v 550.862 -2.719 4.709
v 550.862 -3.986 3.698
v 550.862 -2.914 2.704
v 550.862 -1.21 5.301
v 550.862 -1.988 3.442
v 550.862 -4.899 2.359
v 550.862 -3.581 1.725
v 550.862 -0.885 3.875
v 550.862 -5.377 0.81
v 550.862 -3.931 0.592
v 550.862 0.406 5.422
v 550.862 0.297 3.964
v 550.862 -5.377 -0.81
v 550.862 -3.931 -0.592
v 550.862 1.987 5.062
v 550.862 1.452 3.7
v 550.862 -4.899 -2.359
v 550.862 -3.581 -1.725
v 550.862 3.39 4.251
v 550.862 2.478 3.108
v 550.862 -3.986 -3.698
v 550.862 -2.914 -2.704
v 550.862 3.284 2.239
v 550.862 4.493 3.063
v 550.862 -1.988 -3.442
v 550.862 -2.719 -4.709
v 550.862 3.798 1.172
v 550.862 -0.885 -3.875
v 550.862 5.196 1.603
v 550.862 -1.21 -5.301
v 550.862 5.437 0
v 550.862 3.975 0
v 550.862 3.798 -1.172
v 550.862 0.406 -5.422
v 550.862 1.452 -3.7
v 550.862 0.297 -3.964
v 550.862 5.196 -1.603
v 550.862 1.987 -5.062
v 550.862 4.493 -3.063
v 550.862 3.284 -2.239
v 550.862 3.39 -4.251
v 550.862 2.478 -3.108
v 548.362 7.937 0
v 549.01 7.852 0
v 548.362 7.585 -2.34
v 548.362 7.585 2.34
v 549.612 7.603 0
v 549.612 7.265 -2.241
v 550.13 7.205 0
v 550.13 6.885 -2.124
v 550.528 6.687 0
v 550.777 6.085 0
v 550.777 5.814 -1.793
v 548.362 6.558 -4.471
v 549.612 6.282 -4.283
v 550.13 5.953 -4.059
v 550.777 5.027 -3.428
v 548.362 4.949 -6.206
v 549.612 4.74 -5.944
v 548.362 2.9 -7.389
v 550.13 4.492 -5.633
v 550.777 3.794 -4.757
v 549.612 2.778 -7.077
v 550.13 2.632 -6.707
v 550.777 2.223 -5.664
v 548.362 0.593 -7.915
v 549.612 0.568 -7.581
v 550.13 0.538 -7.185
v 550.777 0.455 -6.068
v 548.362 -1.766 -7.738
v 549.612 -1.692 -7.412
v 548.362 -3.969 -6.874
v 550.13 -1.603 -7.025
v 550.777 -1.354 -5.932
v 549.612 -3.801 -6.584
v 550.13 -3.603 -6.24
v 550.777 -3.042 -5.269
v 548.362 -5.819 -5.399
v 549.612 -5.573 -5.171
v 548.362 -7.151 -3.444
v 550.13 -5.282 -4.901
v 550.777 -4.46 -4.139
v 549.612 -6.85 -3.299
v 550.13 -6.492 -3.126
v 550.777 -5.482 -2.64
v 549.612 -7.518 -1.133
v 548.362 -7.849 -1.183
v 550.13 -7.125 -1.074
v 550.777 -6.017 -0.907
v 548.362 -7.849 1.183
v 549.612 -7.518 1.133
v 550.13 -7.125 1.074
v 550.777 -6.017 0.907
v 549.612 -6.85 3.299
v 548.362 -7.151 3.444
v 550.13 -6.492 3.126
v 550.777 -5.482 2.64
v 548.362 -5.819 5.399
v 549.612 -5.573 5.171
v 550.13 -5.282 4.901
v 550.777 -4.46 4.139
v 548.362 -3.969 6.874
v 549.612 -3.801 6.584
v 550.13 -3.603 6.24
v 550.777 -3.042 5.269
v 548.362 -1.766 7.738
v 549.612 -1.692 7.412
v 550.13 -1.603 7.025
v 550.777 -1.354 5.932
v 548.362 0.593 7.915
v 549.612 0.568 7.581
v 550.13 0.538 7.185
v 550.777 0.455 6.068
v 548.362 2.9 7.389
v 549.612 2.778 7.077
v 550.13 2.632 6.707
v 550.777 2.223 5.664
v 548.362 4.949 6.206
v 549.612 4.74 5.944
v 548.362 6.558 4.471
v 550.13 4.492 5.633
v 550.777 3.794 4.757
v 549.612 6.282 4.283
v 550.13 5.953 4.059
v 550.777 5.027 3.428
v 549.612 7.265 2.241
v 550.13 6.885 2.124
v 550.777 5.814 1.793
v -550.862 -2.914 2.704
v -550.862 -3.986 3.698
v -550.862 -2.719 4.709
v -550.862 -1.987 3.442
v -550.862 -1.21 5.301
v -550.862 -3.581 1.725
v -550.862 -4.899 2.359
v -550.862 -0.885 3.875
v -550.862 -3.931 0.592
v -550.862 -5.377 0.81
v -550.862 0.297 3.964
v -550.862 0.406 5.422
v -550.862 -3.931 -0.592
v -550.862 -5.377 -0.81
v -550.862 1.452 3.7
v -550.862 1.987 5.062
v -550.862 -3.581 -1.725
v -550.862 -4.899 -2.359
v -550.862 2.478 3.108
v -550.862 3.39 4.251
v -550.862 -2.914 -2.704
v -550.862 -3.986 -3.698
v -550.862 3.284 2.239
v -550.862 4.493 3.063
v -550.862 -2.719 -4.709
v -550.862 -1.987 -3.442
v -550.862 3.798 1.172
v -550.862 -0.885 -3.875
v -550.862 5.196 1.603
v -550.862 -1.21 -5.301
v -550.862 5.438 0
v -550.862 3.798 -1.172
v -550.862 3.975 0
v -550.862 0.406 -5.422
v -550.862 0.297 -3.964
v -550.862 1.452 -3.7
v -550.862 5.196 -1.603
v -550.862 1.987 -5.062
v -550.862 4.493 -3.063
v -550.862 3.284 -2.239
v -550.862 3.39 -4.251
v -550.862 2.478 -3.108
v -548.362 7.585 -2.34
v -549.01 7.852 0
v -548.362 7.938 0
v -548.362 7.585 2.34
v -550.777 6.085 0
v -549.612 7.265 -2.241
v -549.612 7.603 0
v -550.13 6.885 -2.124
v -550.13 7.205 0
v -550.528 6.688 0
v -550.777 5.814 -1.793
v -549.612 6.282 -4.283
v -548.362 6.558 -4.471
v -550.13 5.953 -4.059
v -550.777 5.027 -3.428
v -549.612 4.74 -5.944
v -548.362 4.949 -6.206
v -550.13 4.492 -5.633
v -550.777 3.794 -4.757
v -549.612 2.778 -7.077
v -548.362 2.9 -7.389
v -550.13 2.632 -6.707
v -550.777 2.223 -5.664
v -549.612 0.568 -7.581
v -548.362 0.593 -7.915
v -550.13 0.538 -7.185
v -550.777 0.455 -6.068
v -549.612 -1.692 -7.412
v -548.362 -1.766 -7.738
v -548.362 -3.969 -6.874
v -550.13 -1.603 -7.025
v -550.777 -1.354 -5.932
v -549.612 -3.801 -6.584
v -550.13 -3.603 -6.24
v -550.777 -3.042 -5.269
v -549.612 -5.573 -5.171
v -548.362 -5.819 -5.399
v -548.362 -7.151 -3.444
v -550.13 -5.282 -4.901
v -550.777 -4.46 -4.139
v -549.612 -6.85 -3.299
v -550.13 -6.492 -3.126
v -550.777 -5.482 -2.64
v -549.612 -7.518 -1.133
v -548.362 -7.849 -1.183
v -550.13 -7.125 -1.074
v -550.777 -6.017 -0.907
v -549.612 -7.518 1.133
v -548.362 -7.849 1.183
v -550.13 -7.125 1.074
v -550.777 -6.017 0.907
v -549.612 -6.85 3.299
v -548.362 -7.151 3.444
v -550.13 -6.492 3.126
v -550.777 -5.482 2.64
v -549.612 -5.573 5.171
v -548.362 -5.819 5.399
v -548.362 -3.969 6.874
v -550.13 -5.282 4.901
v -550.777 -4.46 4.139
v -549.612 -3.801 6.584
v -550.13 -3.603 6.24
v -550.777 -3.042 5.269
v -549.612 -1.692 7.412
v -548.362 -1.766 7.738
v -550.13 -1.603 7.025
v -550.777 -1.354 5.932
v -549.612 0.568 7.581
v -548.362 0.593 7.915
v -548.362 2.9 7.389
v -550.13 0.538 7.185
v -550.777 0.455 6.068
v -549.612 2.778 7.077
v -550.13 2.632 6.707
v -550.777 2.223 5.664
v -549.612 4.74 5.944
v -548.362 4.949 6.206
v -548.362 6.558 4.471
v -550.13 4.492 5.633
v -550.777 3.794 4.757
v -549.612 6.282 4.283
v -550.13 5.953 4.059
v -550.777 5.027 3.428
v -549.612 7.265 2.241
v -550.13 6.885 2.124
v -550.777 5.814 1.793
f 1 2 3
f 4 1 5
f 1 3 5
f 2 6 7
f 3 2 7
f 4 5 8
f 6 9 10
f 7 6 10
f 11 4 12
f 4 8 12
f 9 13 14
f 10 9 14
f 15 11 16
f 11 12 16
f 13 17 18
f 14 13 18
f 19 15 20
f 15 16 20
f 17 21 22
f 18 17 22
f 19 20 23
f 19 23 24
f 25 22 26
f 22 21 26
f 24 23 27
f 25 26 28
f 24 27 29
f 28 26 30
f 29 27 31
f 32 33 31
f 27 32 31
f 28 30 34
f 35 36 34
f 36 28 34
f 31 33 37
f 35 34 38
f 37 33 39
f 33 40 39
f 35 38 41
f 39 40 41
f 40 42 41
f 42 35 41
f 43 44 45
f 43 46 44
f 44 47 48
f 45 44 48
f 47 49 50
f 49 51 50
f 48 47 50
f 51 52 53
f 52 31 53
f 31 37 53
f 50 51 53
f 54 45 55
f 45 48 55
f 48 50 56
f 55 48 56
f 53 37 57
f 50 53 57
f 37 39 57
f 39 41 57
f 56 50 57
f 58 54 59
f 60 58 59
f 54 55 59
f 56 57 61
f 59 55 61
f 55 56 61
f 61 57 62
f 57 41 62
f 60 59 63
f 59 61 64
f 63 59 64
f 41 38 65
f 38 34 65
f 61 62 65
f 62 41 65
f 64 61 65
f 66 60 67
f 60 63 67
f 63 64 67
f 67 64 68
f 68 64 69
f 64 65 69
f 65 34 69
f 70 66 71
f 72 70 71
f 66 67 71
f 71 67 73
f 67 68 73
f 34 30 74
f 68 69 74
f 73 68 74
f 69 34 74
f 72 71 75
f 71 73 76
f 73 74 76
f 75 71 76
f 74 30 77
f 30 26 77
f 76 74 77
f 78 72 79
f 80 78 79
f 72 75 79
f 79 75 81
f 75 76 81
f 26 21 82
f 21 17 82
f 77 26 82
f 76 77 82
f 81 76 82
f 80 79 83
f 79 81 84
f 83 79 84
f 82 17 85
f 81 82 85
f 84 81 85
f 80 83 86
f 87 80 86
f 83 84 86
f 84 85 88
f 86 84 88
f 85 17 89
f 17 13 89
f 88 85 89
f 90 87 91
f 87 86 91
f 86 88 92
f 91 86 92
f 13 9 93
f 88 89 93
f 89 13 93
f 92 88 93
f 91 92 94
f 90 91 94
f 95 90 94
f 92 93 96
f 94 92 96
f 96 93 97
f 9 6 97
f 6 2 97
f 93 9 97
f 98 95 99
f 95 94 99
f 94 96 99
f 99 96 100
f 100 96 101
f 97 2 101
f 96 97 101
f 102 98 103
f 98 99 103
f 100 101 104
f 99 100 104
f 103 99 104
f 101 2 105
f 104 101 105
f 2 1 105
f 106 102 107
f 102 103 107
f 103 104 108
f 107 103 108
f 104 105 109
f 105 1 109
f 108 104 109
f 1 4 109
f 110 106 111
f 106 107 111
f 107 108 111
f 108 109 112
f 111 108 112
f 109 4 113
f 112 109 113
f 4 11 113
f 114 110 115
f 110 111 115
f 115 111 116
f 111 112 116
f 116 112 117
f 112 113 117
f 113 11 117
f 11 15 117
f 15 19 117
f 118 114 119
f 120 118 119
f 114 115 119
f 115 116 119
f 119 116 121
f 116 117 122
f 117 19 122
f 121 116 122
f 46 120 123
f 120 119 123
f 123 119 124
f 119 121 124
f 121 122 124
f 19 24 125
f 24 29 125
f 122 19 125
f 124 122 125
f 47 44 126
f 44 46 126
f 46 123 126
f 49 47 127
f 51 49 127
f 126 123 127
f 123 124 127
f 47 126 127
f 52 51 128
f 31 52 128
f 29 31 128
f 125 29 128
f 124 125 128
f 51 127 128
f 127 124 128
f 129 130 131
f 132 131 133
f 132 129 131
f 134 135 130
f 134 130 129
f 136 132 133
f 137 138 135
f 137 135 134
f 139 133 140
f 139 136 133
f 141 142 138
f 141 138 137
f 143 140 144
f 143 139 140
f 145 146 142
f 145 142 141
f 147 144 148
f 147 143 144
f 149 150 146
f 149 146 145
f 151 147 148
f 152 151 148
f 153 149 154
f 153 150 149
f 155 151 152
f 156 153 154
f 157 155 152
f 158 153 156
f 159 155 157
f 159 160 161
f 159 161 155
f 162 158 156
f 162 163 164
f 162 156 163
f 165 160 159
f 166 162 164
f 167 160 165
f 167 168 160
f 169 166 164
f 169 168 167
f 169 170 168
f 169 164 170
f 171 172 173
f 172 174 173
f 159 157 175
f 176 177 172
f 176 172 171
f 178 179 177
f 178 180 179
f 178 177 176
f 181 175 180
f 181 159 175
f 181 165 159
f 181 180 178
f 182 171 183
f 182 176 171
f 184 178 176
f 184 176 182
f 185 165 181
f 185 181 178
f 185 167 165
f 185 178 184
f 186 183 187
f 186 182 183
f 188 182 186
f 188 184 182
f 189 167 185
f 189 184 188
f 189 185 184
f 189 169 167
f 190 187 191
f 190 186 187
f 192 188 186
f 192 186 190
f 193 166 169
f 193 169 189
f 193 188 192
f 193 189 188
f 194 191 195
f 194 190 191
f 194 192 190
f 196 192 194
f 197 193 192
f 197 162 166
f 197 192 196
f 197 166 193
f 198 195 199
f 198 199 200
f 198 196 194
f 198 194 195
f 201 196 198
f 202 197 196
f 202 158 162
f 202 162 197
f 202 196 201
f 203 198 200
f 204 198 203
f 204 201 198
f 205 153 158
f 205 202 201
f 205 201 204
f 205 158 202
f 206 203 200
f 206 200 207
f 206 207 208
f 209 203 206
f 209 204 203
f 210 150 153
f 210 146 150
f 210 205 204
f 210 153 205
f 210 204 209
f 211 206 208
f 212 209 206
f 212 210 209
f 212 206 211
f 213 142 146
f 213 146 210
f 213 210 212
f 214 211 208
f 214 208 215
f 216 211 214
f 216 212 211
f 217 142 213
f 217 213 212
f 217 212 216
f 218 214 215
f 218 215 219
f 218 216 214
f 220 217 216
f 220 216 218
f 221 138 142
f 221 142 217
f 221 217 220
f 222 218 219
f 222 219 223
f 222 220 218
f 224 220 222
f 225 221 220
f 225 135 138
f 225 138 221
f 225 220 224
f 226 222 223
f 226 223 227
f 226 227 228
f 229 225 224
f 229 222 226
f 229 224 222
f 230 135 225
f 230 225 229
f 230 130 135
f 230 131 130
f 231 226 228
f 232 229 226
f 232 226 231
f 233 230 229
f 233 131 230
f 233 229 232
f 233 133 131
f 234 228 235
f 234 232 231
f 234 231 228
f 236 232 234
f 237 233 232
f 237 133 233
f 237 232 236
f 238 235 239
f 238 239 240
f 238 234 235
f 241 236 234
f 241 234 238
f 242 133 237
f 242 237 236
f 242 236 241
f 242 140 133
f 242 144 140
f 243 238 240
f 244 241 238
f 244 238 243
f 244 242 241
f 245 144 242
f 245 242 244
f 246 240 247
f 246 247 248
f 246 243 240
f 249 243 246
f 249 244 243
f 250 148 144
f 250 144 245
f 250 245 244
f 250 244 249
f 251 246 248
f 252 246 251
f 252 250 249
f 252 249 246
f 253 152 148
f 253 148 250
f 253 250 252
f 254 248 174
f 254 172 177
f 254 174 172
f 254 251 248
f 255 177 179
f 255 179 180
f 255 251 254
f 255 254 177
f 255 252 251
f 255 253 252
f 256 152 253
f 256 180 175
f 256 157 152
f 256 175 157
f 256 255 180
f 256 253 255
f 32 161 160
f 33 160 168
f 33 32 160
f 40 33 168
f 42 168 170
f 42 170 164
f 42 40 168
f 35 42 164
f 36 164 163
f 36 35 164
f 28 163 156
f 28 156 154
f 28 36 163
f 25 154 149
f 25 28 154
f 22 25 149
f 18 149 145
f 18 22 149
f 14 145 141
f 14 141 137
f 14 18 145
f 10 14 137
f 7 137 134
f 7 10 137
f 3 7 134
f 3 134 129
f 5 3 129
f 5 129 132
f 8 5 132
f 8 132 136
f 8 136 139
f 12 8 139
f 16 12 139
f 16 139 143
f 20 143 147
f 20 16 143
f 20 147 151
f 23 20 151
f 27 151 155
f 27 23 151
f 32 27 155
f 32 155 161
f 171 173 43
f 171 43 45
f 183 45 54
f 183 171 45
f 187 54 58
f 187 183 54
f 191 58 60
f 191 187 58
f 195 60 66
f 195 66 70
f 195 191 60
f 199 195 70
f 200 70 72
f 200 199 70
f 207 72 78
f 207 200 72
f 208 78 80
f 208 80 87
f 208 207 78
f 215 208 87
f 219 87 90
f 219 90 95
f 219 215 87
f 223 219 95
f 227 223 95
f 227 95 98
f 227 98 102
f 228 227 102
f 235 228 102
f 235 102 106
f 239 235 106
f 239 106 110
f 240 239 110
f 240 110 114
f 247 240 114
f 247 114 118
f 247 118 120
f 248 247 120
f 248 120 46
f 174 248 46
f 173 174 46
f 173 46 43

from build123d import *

# Parameters (mm, degrees)
SKETCH_1_R        = 7.9375
SKETCH_1_R_2      = 3.975
EXTRUDE_1_DEPTH   = 550.8625
FILLET_1_R        = 2.5
MOVE_BODY_1_ANGLE = 90


with BuildPart() as part:
    # 스케치1 → 보스-돌출1 (new body, symmetric)
    with BuildSketch(Plane(origin=(0, 0, 0), x_dir=(1, 0, 0), z_dir=(0, 1, 0))):
        Circle(SKETCH_1_R)
        Circle(SKETCH_1_R_2, mode=Mode.SUBTRACT)
    extrude(amount=EXTRUDE_1_DEPTH, both=True)

    # 필렛1
    fillet_1_edges = [part.edges().sort_by_distance(p)[0] for p in [
        (-7.9375, -550.8625, 0),
        (-7.9375, 550.8625, 0),
    ]]
    fillet(fillet_1_edges, radius=FILLET_1_R)


with BuildPart() as part_1:
    # Move Body 1: moved
    add(part.part.rotate(Axis((0, 0, 0), (0, 0, 1)), MOVE_BODY_1_ANGLE))


solid = part_1.part
